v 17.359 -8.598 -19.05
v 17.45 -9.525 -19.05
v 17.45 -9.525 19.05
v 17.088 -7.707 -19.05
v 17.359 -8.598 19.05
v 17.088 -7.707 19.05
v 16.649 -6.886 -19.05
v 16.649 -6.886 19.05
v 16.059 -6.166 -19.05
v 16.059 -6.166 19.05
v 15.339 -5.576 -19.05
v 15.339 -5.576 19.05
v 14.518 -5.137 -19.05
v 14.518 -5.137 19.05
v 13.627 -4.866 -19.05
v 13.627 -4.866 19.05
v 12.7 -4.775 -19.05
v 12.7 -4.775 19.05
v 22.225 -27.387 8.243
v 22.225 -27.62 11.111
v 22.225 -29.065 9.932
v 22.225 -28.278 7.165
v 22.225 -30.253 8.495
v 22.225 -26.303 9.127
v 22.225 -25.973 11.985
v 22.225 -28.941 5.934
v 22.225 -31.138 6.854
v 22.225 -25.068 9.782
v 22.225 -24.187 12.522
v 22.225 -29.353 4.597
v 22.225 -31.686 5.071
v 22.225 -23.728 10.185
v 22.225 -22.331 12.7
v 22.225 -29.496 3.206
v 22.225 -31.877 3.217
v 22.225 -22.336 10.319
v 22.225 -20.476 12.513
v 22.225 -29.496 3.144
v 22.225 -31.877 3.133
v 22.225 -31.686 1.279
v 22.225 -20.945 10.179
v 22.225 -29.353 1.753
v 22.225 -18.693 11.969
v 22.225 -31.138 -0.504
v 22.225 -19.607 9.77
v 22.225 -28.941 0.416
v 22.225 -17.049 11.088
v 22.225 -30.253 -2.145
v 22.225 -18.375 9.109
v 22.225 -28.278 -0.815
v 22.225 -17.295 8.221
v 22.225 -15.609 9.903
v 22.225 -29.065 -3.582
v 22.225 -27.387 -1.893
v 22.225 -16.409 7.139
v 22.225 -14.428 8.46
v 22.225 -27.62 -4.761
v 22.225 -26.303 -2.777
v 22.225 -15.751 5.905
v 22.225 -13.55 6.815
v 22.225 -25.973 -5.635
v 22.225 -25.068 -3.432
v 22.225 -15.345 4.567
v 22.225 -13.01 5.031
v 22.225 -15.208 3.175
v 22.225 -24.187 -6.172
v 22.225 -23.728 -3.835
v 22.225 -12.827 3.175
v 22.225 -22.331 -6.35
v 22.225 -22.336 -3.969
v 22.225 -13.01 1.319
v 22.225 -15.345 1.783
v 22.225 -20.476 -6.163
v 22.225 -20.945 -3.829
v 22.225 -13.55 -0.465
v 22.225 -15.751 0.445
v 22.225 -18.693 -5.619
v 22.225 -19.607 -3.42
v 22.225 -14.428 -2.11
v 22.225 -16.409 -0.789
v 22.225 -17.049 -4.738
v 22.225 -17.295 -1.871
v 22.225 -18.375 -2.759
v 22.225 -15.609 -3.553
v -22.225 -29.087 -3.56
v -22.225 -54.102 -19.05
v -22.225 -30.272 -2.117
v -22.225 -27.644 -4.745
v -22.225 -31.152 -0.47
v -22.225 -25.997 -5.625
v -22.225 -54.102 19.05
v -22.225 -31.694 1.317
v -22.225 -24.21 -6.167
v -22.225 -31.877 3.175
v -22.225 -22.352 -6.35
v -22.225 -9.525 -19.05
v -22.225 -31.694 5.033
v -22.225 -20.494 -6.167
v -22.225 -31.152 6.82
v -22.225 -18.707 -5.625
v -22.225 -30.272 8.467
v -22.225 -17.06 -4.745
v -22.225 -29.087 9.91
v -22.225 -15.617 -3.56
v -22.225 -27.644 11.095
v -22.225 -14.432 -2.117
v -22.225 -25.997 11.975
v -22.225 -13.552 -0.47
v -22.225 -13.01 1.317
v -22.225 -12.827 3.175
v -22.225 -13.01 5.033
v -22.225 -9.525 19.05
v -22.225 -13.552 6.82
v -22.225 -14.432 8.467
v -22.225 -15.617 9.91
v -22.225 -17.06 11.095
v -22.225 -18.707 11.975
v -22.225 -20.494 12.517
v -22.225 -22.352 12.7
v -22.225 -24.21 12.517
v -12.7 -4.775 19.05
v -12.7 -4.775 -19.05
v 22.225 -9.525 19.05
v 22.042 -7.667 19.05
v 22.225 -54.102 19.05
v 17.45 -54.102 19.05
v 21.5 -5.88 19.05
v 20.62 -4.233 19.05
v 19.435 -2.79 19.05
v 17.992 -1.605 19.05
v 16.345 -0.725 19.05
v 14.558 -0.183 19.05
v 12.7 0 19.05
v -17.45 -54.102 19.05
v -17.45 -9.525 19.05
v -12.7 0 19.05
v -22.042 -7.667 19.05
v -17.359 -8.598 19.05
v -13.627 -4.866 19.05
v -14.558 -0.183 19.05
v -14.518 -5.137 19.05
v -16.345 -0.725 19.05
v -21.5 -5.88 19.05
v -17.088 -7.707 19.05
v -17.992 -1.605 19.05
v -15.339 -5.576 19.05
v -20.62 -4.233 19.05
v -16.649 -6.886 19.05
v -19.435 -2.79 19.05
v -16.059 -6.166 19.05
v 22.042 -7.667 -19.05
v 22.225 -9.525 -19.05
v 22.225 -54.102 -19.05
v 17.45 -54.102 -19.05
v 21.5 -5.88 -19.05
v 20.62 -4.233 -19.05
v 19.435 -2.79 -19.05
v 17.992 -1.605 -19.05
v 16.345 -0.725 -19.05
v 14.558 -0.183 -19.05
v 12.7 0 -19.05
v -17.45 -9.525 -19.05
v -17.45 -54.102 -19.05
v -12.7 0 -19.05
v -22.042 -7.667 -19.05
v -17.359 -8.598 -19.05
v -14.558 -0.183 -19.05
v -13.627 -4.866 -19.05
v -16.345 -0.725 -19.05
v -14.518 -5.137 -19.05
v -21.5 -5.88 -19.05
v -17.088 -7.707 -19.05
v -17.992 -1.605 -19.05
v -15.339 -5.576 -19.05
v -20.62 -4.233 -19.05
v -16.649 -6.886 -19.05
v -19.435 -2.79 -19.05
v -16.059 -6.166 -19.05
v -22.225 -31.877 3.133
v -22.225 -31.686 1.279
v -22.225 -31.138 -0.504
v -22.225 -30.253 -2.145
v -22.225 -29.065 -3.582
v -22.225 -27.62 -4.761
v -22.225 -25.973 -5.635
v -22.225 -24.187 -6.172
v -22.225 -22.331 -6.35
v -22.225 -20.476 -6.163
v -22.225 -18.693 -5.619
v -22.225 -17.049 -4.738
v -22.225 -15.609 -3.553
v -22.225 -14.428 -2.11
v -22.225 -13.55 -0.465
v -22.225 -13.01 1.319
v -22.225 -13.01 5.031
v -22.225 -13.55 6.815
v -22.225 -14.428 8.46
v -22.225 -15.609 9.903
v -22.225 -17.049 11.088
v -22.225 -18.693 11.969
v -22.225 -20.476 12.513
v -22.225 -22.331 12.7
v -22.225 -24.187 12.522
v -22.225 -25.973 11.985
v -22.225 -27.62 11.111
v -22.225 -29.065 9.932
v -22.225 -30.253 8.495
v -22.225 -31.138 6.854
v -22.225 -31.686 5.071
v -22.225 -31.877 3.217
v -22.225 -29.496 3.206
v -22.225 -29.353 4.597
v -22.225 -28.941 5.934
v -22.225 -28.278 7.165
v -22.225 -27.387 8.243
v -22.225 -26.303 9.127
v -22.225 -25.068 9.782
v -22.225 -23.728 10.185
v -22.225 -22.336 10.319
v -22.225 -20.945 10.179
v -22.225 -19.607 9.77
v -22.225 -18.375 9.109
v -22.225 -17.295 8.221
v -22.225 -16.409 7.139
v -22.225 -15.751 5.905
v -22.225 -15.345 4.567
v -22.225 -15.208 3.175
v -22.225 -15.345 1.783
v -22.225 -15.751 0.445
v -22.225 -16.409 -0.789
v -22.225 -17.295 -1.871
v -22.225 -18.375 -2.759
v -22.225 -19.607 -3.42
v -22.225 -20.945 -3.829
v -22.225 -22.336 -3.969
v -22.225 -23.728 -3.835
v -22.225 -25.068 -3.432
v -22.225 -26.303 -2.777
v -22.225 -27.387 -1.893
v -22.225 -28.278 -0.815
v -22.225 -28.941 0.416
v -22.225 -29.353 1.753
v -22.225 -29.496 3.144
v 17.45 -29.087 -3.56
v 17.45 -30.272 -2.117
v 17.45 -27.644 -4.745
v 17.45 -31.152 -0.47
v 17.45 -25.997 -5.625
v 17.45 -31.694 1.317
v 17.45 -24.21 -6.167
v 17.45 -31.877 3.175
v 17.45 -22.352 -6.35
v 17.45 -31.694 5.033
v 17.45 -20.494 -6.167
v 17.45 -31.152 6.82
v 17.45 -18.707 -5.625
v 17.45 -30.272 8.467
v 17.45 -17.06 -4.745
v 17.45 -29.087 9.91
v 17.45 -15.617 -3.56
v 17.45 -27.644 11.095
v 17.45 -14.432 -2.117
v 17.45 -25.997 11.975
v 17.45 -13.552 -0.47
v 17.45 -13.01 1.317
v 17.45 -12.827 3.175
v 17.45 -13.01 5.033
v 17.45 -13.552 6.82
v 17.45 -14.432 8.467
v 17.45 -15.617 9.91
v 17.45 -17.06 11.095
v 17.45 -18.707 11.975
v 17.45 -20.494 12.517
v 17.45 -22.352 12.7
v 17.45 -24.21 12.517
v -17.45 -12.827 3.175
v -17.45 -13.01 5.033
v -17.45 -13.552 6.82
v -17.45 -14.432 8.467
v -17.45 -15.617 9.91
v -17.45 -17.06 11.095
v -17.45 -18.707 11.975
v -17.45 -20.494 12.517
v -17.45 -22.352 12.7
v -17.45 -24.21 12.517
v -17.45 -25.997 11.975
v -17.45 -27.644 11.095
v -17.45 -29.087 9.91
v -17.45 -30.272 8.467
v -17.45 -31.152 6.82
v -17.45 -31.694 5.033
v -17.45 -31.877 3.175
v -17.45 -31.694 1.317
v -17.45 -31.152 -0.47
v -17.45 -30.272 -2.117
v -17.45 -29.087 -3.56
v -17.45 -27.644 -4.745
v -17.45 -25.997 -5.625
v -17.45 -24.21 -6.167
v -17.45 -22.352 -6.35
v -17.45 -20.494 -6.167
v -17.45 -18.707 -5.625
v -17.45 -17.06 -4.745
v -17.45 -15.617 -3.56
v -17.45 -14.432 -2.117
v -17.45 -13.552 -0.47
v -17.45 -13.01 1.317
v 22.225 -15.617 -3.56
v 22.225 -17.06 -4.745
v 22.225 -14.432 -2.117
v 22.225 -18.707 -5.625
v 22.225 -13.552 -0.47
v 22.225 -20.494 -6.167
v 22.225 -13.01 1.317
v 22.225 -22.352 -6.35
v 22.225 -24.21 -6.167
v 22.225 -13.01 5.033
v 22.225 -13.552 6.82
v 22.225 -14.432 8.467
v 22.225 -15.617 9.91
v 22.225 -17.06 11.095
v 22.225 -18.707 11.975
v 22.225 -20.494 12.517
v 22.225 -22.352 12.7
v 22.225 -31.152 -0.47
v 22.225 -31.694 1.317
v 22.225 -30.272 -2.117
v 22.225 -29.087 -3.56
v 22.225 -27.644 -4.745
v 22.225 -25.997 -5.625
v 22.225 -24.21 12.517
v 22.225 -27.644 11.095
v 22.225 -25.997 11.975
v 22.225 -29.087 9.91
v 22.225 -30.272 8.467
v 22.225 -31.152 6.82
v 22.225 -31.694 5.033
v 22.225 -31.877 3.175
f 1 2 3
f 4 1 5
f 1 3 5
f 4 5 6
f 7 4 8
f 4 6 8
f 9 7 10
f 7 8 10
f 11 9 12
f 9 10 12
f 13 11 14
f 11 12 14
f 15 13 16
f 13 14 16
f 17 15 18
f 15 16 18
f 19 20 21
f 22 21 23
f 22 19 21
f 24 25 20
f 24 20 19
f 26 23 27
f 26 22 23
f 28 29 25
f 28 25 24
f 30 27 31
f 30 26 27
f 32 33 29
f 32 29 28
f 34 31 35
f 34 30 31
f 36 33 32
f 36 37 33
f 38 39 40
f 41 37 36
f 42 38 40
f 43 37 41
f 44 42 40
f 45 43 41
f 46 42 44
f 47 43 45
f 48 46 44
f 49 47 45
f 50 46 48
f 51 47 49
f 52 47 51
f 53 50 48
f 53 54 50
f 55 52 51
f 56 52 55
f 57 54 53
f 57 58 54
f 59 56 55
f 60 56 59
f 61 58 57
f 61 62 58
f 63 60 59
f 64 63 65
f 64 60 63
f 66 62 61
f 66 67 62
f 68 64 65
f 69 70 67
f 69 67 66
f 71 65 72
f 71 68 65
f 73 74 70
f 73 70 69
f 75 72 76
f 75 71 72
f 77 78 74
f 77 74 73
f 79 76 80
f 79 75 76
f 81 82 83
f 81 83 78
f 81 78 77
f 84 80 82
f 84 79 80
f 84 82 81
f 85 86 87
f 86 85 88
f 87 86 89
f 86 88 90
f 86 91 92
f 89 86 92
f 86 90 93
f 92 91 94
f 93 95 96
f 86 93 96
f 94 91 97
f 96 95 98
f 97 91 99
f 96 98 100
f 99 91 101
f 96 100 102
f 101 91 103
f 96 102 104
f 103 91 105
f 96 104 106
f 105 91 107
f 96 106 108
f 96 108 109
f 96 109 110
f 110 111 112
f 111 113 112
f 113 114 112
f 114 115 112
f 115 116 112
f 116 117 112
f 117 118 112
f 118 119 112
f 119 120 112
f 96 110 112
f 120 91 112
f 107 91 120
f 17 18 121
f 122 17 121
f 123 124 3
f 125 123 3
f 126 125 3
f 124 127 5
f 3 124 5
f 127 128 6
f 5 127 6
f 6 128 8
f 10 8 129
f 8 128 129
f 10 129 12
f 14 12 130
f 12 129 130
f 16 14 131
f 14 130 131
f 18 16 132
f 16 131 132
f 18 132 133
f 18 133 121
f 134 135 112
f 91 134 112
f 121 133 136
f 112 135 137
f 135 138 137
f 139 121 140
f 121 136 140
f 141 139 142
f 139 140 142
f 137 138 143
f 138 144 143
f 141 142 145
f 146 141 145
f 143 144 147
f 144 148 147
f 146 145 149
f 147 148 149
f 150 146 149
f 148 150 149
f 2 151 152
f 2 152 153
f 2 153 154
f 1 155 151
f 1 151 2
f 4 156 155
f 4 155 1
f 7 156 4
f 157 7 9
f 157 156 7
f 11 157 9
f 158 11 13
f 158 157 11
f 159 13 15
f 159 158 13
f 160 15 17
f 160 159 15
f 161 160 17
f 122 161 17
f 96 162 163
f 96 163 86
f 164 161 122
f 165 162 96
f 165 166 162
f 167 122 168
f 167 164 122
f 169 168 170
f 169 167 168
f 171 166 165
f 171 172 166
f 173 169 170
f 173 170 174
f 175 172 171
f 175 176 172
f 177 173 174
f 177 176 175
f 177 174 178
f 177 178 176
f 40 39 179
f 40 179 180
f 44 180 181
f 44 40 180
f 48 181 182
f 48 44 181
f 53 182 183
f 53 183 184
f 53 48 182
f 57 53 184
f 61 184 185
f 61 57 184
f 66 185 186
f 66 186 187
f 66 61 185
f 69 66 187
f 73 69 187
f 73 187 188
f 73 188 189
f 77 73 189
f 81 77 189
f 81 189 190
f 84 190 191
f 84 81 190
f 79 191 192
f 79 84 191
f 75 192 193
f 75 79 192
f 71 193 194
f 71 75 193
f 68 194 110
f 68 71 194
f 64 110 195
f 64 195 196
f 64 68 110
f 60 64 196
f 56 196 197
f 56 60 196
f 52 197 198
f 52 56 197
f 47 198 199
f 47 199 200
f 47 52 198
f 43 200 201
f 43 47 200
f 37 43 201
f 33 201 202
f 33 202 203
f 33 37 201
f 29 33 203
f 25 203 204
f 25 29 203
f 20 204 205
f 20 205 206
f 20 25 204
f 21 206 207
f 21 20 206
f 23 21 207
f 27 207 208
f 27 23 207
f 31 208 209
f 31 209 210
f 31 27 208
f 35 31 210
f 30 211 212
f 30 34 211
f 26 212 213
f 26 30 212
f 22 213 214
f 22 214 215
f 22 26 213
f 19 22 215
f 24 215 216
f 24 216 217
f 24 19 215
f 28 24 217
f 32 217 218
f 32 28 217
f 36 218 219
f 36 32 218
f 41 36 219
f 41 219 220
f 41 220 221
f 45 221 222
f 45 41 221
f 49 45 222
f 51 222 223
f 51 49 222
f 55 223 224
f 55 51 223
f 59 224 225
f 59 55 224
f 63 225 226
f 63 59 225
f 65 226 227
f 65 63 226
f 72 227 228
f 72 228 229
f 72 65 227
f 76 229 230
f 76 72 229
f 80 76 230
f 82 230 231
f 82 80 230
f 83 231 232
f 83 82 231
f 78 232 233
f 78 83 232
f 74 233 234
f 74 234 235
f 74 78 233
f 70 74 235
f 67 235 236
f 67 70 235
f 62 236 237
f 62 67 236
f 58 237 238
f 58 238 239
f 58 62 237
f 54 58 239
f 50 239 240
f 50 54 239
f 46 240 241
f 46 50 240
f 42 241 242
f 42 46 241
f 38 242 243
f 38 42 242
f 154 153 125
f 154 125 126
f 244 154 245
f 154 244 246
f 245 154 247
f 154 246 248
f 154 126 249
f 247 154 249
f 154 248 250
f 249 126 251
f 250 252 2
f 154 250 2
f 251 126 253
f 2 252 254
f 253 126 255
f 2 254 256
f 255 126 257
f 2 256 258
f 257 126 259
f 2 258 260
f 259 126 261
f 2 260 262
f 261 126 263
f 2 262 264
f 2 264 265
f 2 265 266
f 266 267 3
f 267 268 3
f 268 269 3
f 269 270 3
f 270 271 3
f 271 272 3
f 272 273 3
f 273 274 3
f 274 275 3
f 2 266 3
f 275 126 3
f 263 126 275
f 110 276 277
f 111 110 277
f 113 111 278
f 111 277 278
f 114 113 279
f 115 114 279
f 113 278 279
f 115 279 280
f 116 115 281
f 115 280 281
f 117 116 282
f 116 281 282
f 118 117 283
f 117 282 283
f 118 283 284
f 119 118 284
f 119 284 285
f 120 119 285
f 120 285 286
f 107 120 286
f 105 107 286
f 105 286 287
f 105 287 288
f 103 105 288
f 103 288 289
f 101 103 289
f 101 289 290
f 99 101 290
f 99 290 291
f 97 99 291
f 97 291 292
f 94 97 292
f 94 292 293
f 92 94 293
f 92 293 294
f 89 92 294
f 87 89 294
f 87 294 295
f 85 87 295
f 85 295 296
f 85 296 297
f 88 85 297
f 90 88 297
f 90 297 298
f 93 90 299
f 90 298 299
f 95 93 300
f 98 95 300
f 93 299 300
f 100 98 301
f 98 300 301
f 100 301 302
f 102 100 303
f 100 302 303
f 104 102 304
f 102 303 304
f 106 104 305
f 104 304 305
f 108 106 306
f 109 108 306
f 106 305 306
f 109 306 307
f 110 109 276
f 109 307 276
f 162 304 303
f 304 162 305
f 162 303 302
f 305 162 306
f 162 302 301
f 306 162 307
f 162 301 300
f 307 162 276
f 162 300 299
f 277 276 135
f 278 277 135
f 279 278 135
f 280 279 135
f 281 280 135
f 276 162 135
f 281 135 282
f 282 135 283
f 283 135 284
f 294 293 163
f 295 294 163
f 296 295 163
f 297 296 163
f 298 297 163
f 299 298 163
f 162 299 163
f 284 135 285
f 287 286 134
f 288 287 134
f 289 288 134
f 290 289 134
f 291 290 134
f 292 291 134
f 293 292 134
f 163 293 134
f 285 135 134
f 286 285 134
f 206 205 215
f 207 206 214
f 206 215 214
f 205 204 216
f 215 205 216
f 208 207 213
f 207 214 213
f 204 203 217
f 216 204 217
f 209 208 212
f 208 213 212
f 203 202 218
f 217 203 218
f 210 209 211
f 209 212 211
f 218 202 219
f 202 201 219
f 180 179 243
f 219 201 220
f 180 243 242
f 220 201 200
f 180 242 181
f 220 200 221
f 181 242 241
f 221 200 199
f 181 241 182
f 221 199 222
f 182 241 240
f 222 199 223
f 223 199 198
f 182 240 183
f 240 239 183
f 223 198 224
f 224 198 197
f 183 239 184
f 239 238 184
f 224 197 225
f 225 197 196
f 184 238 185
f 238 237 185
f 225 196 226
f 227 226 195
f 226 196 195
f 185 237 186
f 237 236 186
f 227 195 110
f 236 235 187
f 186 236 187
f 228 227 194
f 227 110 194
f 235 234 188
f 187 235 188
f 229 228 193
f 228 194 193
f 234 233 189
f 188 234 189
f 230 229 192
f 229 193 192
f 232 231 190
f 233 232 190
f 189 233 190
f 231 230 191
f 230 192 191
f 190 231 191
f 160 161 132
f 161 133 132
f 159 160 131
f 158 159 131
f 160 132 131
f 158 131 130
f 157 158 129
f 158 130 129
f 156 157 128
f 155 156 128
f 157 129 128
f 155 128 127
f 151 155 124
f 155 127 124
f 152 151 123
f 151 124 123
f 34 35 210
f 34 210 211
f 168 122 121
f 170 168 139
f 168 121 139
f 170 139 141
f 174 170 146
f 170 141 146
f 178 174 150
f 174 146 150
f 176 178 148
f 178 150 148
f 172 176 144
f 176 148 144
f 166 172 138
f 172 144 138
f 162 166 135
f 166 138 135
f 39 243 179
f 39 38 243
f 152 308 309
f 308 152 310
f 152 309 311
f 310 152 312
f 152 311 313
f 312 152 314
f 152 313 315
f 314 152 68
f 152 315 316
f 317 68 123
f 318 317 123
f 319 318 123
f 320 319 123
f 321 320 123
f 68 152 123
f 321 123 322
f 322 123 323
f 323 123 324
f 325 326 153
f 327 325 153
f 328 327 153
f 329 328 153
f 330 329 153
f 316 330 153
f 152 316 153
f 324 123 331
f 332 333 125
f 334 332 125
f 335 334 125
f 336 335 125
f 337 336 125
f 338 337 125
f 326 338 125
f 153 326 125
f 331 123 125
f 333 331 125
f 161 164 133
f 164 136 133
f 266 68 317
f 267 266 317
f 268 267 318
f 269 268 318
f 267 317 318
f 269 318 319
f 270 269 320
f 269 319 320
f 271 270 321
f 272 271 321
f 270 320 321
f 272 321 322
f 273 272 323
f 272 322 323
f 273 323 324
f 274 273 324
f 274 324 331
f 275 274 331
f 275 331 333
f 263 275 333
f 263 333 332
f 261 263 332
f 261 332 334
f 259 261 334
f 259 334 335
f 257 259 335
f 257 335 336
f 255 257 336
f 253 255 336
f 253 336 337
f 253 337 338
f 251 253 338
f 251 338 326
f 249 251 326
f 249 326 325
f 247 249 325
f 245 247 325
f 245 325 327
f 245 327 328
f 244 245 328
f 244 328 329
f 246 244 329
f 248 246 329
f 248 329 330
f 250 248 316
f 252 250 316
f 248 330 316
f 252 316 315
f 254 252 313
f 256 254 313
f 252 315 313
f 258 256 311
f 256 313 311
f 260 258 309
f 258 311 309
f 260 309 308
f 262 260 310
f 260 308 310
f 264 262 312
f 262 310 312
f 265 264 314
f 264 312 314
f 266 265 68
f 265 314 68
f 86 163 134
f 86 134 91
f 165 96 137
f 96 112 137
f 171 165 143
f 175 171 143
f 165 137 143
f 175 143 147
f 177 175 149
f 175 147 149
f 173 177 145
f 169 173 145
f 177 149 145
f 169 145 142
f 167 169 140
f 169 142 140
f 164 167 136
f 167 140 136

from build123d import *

# Parameters (mm, degrees)
BOSS_EXTRUDE1_DEPTH = 19.05
SKETCH2_R           = 9.525
CUT_EXTRUDE1_DEPTH  = 73.565359532
BOSS_EXTRUDE2_DEPTH = 22.225


with BuildPart() as part:
    # Sketch1 → Boss-Extrude1 (new, symmetric)
    with BuildSketch(Plane.XY):
        with BuildLine():
            Line((-17.4498, -9.525), (-17.4498, -54.102))
            Line((-17.4498, -54.102), (-22.225, -54.102))
            Line((-22.225, -54.102), (-22.225, -9.525))
            ThreePointArc((-22.225, -9.525), (-19.435192091, -2.789807909), (-12.7, 0))
            Line((-12.7, 0), (12.7, 0))
            ThreePointArc((12.7, 0), (19.435192091, -2.789807909), (22.225, -9.525))
            Line((22.225, -9.525), (22.225, -54.102))
            Line((22.225, -54.102), (17.4498, -54.102))
            Line((17.4498, -54.102), (17.4498, -9.525))
            ThreePointArc((17.4498, -9.525), (16.058615789, -6.166384211), (12.7, -4.7752))
            Line((12.7, -4.7752), (-12.7, -4.7752))
            ThreePointArc((-12.7, -4.7752), (-16.058615789, -6.166384211), (-17.4498, -9.525))
        make_face()
    extrude(amount=BOSS_EXTRUDE1_DEPTH, both=True)

    # Sketch2 → Cut-Extrude1 (cut, through all)
    with BuildSketch(Plane(origin=(22.225, 0, 0), x_dir=(0, 0, -1), z_dir=(1, 0, 0))):
        with Locations(Location((-3.175, -22.352, 0), (0, 0, 90))):
            Circle(SKETCH2_R)
    extrude(amount=-CUT_EXTRUDE1_DEPTH, mode=Mode.SUBTRACT)


with BuildPart() as body_2:
    # Sketch3 → Boss-Extrude2 (new, symmetric)
    with BuildSketch(Plane(origin=(0, 0, 0), x_dir=(0, 0, -1), z_dir=(1, 0, 0))):
        with BuildLine():
            Line((-3.143829609, -29.495681997), (-3.133439479, -31.876909329))
            ThreePointArc((-3.133439479, -31.876909329), (-3.175, -12.827), (-3.216560521, -31.876909329))
            Line((-3.216560521, -31.876909329), (-3.206170391, -29.495681997))
            ThreePointArc((-3.206170391, -29.495681997), (-3.175, -15.20825), (-3.143829609, -29.495681997))
        make_face()
    extrude(amount=BOSS_EXTRUDE2_DEPTH, both=True)


solid = Compound([part.part, body_2.part])
